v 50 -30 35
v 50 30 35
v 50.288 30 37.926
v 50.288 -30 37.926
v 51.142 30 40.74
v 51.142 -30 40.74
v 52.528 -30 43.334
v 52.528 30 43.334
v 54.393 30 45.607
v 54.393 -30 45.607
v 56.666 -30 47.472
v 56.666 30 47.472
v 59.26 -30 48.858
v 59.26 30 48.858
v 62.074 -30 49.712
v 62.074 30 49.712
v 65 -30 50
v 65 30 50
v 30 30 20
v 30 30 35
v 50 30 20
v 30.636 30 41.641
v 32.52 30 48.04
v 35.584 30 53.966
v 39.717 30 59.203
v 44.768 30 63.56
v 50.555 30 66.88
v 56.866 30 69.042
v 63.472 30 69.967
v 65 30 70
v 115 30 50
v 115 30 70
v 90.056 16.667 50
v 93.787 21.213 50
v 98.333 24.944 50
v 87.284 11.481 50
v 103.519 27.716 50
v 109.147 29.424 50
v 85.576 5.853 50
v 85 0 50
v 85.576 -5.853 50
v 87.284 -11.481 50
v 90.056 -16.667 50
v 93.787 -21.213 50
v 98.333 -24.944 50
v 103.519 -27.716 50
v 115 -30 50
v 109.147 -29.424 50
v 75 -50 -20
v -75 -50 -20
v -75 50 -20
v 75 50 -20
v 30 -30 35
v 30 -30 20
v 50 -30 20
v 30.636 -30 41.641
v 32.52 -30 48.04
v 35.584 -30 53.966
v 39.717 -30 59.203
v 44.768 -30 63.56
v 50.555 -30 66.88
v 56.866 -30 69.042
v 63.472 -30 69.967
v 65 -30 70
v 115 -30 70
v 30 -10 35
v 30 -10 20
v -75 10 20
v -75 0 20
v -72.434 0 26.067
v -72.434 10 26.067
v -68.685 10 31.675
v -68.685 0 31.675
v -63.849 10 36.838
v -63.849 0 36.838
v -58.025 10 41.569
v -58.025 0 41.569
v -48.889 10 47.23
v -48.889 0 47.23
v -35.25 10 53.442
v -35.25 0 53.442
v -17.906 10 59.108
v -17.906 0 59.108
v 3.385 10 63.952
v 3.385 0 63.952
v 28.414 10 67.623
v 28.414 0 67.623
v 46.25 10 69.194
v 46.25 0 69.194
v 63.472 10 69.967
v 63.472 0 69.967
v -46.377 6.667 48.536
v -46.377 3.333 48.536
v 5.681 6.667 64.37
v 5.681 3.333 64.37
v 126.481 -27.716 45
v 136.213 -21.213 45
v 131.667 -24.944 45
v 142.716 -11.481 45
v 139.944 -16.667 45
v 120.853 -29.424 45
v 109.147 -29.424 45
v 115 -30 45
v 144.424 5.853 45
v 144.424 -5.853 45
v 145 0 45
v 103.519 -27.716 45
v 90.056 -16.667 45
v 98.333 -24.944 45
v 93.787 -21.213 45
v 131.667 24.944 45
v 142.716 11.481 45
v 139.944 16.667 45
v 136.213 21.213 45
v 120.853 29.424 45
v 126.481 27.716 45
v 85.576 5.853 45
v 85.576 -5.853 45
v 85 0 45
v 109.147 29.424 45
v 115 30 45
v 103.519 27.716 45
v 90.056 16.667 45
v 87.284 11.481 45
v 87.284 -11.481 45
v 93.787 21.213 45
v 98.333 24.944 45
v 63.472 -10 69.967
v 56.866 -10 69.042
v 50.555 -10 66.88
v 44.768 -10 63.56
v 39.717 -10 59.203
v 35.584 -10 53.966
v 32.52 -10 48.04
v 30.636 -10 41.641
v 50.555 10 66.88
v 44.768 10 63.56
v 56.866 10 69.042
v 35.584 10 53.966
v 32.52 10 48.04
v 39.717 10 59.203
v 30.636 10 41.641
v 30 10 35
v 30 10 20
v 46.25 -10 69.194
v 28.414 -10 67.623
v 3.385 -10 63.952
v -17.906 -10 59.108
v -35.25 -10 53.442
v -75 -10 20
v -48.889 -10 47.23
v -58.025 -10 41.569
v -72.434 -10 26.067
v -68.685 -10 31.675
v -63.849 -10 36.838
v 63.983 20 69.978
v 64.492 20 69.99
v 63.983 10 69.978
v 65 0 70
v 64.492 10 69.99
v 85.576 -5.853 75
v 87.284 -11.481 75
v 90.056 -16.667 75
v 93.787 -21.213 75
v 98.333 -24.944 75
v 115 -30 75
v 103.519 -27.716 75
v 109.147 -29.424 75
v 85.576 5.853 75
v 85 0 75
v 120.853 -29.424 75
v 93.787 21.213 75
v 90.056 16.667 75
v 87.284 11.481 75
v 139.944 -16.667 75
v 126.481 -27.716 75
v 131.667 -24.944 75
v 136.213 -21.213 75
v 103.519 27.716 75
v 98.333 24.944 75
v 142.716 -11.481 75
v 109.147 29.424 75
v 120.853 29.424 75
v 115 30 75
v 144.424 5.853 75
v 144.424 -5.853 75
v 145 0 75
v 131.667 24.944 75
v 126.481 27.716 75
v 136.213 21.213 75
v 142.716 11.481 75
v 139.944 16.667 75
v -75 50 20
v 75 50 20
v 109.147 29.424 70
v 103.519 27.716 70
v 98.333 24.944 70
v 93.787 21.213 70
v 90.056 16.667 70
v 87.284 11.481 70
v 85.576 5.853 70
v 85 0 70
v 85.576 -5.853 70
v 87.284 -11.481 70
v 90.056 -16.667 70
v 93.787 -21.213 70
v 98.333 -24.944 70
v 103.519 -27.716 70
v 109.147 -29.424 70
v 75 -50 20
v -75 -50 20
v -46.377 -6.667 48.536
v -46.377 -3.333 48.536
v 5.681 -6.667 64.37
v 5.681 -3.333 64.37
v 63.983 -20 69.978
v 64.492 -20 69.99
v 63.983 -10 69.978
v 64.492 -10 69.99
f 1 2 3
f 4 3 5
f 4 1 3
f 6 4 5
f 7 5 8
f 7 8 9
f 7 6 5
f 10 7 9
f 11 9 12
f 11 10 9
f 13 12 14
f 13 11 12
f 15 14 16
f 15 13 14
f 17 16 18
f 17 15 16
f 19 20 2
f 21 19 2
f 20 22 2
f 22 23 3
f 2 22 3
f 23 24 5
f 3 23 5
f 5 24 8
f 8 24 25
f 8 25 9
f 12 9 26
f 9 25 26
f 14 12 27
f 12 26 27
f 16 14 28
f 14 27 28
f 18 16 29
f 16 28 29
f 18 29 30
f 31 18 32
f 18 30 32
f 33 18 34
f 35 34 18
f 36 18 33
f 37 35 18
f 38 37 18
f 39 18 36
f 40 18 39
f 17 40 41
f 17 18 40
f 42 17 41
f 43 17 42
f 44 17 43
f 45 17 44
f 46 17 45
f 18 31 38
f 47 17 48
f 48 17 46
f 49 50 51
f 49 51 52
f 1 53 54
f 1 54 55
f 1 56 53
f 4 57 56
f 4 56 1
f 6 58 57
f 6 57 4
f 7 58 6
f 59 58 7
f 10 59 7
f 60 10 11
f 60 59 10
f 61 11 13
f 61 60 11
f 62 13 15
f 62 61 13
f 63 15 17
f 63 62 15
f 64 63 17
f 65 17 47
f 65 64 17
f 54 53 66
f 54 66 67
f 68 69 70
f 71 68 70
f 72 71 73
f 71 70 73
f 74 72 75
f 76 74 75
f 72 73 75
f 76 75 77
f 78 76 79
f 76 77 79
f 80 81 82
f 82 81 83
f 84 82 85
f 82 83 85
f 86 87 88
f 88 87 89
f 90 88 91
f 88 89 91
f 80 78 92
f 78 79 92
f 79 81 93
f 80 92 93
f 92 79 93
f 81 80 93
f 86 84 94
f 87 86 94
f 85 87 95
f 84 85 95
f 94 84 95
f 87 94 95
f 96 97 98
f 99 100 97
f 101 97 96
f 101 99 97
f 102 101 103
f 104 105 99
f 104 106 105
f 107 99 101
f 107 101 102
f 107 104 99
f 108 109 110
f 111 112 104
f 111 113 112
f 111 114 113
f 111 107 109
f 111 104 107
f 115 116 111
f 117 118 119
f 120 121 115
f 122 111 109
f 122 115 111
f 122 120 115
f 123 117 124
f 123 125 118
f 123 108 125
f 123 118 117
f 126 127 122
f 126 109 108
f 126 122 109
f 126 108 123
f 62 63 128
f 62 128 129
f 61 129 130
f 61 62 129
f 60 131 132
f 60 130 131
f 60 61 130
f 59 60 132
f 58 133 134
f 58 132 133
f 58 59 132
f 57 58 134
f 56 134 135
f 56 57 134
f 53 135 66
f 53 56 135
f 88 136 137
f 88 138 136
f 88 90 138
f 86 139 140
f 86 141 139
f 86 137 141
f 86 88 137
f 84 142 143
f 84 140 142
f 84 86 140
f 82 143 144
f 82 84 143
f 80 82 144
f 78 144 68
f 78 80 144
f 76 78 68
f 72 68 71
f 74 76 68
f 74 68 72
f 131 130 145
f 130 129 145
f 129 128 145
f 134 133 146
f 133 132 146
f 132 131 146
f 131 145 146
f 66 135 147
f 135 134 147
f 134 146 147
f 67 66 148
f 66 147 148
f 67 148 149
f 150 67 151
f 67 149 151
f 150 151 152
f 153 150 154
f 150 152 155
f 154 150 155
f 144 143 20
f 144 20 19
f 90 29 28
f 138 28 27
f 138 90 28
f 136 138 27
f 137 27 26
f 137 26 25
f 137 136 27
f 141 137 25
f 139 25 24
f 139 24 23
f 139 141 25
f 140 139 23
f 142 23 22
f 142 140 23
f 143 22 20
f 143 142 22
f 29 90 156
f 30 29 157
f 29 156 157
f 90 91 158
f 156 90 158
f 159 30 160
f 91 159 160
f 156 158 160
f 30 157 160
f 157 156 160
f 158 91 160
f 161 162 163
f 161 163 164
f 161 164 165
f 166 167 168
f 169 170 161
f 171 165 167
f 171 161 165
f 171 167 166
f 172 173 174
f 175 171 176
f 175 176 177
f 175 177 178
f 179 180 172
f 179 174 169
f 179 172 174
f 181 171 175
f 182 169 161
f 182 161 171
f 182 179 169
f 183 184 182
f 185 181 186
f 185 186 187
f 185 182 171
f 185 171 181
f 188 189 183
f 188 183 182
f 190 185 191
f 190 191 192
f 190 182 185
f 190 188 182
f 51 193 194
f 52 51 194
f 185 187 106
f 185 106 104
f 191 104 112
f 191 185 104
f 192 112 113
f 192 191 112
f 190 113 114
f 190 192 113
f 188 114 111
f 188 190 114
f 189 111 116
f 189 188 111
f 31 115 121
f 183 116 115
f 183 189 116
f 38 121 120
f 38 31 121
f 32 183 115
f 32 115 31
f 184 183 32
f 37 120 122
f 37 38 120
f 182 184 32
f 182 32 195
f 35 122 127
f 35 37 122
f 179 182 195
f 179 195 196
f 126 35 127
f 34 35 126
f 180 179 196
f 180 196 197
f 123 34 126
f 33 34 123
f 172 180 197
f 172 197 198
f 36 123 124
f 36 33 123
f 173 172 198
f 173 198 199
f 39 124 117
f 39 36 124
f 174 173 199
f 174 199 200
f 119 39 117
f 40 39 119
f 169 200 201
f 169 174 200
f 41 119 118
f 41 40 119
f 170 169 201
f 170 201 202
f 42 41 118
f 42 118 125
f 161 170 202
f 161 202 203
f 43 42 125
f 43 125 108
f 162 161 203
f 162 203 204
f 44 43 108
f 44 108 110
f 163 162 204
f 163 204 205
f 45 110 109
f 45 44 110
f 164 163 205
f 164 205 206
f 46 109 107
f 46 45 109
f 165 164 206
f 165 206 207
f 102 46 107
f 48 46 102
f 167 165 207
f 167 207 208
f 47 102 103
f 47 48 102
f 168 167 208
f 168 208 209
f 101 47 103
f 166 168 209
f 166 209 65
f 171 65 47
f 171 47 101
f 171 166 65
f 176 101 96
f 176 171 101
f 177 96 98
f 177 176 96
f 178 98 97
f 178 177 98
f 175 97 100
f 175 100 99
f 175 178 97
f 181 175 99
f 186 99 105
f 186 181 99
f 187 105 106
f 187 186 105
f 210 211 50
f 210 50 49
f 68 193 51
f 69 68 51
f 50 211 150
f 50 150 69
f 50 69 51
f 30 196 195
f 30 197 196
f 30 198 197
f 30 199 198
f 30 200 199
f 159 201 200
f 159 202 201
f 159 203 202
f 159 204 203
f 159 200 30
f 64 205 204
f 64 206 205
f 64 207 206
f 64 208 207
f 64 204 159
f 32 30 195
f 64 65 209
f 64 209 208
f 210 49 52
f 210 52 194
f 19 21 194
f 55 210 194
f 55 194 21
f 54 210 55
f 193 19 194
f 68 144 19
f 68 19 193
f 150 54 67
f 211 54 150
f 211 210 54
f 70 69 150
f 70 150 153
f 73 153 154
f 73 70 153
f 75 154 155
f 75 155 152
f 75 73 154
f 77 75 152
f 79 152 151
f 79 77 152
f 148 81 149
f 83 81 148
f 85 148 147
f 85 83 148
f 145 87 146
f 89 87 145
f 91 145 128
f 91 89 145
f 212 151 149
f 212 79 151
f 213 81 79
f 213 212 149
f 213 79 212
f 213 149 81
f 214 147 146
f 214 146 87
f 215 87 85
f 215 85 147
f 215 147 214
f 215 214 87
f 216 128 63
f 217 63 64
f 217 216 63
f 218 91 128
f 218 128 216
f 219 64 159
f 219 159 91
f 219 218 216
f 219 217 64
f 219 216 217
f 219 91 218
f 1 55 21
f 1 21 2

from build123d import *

# Parameters (mm, degrees)
F1_DEPTH = 50
F0_W     = 30
F0_H     = 20
F2_DEPTH = 30
F4_DEPTH = 10


with BuildPart() as f1:
    # F0 (on Front) → F1 (new body, symmetric)
    with BuildSketch(Plane.XZ):
        Polygon((30, 20), (-75, 20), (-75, -20), (75, -20), (75, 20), (50, 20), align=None)
    extrude(amount=F1_DEPTH, both=True)

    # F0 (on Front) → F2 (join, symmetric)
    with BuildSketch(Plane.XZ):
        with BuildLine():
            Line((30, 35), (30, 20))
            Line((30, 20), (50, 20))
            Line((50, 20), (50, 35))
            ThreePointArc((50, 35), (54.3933982822, 45.6066017178), (65, 50))
            Line((65, 50), (85, 50))
            Line((85, 50), (85, 70))
            Line((85, 70), (65, 70))
            add(Edge.make_bspline(
                [(63.4724068362, 69.9666478108), (63.9831880061, 69.9787764937), (64.4924072773, 69.9898908886), (65, 70)],
                knots=[147.2868078235, 147.2868078235, 147.2868078235, 147.2868078235, 148.6606874732, 148.6606874732, 148.6606874732, 148.6606874732], degree=3))
            ThreePointArc((63.4724068362, 69.9666478108), (39.7169447976, 59.2026262962), (30, 35))
        make_face()
        with Locations((100, 60)):
            Rectangle(F0_W, F0_H)
    extrude(amount=F2_DEPTH, both=True)

    # F0 (on Front) → F3 (revolve)
    with BuildSketch(Plane.XZ):
        Polygon((115, 75), (115, 70), (115, 50), (115, 45), (145, 45), (145, 75), align=None)
    revolve(axis=Axis((115, 0, 60), (0, 0, 1)))

    # F0 (on Front) → F4 (join, symmetric)
    with BuildSketch(Plane.XZ):
        with BuildLine():
            add(Edge.make_bspline(
                [(-75, 20), (-63.9949885725, 55.7090067292), (8.7140966472, 68.6663920064), (63.4724068362, 69.9666478108)],
                knots=[0, 0, 0, 0, 147.2868078235, 147.2868078235, 147.2868078235, 147.2868078235], degree=3))
            Line((-75, 20), (30, 20))
            Line((30, 20), (30, 35))
            ThreePointArc((30, 35), (39.7169447976, 59.2026262962), (63.4724068362, 69.9666478108))
        make_face()
    extrude(amount=F4_DEPTH, both=True)


solid = f1.part
